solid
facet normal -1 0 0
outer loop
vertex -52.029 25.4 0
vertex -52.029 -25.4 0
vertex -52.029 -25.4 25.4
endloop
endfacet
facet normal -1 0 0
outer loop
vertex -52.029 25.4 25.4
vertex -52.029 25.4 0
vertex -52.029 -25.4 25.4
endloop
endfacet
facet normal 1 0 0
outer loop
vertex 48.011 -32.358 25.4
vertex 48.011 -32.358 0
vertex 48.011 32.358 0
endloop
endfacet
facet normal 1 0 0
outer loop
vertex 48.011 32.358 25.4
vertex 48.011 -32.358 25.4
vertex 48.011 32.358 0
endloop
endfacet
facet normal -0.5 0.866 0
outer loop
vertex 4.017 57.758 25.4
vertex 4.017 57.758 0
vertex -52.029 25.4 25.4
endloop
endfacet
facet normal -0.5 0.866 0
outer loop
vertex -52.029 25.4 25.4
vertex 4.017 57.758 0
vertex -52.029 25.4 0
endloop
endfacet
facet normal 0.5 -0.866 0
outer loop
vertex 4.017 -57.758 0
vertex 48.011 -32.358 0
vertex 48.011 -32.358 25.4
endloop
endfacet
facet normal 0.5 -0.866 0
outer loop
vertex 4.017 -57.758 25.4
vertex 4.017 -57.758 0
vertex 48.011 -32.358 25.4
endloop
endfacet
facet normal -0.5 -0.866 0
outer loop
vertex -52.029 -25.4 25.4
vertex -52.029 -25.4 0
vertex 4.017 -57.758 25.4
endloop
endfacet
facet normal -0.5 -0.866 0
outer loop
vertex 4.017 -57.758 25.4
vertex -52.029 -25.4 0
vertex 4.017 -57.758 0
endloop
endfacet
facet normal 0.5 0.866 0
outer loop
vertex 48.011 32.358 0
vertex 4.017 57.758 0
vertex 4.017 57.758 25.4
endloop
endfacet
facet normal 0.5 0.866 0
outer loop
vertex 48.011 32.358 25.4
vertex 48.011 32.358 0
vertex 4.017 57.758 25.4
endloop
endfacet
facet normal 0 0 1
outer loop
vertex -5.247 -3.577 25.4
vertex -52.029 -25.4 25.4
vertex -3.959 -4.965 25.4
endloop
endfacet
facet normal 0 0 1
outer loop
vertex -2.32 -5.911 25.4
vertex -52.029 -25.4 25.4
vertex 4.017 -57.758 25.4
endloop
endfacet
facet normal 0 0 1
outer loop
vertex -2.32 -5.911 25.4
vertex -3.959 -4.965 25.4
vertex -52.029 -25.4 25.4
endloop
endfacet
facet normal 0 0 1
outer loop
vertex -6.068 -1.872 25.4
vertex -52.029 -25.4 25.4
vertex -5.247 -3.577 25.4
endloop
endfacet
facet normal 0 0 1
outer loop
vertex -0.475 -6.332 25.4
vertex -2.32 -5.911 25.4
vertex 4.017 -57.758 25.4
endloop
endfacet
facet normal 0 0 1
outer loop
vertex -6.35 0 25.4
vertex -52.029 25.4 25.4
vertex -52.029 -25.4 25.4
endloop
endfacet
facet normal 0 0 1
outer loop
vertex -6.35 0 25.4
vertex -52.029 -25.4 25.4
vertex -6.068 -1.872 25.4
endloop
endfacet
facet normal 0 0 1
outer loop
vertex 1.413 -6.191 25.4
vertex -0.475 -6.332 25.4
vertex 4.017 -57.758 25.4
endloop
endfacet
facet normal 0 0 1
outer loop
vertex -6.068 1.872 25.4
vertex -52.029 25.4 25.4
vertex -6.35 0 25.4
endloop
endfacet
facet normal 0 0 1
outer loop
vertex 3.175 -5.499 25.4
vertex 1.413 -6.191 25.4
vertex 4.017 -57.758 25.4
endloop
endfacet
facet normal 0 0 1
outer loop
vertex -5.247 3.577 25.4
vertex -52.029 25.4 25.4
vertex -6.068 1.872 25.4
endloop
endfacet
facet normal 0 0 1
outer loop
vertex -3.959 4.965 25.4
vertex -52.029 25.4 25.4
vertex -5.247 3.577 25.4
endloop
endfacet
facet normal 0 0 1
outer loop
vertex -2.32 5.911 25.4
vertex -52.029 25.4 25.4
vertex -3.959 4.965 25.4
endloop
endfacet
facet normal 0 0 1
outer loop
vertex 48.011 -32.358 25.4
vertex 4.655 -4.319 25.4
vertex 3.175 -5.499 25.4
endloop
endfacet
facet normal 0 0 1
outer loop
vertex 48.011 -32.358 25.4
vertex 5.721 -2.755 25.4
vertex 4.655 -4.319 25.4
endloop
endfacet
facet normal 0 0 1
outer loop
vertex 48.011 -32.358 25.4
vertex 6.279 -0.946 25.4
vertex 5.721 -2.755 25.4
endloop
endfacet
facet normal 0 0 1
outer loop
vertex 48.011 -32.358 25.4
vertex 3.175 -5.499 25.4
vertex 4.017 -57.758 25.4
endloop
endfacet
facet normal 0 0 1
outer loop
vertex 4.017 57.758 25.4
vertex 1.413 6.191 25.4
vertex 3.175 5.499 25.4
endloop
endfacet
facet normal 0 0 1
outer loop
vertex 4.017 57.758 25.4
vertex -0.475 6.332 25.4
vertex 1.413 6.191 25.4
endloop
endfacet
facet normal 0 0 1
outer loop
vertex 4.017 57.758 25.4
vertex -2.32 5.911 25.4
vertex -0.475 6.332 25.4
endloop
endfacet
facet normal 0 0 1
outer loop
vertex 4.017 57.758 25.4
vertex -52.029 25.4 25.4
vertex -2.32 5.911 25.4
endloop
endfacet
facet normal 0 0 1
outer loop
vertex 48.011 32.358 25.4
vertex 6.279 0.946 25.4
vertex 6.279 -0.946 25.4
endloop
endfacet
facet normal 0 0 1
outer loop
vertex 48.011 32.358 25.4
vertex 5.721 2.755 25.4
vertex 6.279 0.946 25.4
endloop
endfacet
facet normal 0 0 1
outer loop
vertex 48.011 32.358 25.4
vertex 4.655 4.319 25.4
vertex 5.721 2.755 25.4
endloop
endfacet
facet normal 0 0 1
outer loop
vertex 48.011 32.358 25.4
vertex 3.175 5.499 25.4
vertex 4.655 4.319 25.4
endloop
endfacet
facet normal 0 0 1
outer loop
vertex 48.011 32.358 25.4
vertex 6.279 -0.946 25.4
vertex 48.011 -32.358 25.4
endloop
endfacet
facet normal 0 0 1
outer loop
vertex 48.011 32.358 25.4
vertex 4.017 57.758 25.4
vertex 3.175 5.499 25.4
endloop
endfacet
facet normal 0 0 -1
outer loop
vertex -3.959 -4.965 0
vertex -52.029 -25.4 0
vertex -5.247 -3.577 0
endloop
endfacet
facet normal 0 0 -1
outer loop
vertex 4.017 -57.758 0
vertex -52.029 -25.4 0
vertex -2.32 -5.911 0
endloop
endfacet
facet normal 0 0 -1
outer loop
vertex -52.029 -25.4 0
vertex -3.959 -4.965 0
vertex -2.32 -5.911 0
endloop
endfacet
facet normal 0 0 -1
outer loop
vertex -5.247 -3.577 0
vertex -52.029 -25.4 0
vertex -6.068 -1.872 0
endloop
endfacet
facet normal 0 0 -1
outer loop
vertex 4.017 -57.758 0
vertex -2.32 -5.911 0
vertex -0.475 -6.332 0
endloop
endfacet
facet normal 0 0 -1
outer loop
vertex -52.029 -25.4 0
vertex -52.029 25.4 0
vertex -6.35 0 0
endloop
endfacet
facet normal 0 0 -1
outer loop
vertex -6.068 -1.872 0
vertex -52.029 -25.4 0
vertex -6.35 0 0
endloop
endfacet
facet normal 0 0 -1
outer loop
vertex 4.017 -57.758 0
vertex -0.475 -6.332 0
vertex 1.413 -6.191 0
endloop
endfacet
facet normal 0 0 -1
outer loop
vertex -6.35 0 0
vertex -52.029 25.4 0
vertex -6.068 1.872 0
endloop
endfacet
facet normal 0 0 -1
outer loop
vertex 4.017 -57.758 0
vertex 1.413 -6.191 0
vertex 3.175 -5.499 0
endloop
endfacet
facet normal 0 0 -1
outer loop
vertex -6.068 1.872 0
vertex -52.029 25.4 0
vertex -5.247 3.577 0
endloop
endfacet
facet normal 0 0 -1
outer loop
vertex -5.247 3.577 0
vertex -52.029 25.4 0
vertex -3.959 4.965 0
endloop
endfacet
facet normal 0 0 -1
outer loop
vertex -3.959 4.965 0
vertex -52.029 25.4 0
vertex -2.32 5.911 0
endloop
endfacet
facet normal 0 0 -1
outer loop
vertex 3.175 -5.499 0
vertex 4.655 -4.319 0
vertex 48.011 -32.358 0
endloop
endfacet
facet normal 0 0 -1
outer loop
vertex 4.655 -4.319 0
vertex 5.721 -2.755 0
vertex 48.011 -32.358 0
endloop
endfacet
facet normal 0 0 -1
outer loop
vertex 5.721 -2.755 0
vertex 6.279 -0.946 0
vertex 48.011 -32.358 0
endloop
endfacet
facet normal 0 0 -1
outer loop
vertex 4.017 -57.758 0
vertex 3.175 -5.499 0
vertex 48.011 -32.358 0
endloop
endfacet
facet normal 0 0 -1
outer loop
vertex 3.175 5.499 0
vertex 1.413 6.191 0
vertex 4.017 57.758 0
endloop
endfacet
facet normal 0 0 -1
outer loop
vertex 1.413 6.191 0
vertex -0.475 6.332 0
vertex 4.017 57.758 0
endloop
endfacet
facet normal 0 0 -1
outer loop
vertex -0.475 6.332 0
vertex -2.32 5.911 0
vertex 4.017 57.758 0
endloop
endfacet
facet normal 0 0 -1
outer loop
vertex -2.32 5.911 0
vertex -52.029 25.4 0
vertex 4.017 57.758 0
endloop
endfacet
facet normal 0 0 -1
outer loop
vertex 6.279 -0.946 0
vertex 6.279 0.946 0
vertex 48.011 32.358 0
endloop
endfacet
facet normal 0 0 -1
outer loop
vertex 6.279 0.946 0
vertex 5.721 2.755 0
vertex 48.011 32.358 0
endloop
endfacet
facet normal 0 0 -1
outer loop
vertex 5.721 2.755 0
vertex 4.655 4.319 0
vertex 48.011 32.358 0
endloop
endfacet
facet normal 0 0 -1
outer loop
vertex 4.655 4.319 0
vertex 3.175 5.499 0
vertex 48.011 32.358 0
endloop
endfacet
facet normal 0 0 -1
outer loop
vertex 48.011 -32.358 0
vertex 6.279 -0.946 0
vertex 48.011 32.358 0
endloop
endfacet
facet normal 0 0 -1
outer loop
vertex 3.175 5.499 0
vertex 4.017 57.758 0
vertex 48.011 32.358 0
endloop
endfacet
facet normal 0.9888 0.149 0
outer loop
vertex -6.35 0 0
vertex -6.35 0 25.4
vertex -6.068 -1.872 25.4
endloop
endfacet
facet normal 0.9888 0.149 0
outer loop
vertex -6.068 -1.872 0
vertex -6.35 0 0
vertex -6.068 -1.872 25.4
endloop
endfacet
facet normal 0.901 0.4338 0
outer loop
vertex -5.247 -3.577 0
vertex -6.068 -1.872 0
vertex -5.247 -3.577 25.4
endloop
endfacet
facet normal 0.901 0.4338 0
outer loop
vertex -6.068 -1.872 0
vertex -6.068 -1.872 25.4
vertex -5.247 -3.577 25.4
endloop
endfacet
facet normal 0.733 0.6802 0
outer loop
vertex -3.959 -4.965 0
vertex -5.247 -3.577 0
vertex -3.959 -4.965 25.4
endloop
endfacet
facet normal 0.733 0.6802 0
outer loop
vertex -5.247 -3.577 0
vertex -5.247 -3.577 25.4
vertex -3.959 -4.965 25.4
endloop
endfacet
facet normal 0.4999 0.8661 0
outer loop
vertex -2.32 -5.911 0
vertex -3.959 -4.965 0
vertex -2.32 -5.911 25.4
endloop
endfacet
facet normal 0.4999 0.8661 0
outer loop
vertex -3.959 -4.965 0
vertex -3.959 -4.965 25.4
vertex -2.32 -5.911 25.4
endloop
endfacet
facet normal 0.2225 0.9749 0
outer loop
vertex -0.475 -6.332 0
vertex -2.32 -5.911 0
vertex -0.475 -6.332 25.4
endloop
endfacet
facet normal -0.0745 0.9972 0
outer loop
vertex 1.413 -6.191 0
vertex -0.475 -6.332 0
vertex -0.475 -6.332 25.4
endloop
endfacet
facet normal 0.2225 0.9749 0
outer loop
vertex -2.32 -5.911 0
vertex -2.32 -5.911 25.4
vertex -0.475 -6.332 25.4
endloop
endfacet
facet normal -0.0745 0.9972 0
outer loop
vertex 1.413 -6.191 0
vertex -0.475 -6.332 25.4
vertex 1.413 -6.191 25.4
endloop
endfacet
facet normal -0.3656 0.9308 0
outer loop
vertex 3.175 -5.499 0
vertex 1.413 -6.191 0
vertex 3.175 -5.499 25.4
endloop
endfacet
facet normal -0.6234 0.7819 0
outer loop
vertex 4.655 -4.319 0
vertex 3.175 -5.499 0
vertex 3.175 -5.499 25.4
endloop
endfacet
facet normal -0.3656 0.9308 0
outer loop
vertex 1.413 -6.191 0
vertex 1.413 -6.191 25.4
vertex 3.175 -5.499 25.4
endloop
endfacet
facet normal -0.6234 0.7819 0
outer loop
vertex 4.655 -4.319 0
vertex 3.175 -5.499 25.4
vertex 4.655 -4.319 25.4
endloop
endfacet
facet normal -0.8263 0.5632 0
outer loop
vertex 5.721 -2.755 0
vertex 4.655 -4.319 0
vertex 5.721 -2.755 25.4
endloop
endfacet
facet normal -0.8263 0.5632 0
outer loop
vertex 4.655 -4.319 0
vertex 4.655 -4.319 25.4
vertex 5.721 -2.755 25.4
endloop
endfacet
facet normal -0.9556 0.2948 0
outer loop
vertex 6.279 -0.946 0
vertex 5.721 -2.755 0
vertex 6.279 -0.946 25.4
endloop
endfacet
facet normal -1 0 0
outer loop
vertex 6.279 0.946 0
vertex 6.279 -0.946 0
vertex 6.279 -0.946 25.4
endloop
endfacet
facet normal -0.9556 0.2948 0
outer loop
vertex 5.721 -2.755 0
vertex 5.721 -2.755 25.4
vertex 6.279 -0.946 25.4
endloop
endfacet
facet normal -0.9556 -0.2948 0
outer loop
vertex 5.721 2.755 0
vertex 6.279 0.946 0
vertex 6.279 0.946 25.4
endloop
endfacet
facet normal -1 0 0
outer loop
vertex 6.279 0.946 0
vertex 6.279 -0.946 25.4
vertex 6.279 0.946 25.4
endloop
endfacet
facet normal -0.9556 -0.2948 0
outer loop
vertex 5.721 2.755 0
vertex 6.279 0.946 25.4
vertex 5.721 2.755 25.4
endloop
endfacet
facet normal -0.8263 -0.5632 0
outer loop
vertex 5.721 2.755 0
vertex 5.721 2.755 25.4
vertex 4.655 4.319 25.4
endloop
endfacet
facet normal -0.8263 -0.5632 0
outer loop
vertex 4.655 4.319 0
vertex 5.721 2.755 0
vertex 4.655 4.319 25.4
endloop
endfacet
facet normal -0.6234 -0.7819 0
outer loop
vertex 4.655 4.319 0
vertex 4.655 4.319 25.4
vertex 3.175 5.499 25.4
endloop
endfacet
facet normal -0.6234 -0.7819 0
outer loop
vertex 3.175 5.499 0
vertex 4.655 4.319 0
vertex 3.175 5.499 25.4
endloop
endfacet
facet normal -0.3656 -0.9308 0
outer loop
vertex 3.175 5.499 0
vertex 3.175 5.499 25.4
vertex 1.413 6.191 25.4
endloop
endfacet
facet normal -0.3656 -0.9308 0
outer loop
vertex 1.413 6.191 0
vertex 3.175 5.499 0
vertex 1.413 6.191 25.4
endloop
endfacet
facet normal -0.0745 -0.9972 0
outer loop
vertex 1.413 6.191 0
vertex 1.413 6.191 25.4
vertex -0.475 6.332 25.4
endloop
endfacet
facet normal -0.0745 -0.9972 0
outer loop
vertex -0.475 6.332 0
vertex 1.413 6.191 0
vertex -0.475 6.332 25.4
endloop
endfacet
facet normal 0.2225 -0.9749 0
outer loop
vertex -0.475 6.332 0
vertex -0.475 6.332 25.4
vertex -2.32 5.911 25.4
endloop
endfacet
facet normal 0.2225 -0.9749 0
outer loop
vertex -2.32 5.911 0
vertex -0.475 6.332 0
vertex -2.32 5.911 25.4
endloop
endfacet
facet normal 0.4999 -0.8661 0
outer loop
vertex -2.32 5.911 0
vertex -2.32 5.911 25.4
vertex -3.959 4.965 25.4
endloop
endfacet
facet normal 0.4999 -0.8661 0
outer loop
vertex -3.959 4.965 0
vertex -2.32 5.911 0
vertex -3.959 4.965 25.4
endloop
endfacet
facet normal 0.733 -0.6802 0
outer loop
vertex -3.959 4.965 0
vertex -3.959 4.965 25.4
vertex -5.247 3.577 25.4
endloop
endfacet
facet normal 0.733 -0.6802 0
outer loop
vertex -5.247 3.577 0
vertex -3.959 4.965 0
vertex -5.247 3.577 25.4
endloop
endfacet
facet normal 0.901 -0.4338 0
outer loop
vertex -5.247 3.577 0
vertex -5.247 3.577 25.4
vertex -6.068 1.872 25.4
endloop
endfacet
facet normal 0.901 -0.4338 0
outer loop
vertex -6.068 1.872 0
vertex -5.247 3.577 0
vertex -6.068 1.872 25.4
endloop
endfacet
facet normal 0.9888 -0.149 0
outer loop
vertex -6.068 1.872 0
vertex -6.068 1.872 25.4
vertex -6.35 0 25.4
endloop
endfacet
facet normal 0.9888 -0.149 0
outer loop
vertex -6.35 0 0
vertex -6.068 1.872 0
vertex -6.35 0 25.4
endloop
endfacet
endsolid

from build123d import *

# Parameters (mm, degrees)
F1_DEPTH = 25.4
F2_D     = 12.7
F3_SIZE  = 50.8


with BuildPart() as f1:
    # F0 (on Top) → F1 (new body)
    with BuildSketch(Plane.XY):
        Polygon((48.011348, -83.158093), (48.011348, 83.158093), (-96.022695, 0), align=None)
    extrude(amount=F1_DEPTH)

    # F2 (through all)
    with Locations(Plane(origin=(0, 0, 0), x_dir=(1, 0, 0), z_dir=(0, 0, -1))):
        with Locations((0, 0)):
            Hole(F2_D / 2)

    # F3
    f3_edges = [f1.edges().sort_by_distance(p)[0] for p in [
        (48.011348, -83.158093, 12.7),
        (48.011348, 83.158093, 12.7),
        (-96.022695, 0, 12.7),
    ]]
    chamfer(f3_edges, length=F3_SIZE)


solid = f1.part
